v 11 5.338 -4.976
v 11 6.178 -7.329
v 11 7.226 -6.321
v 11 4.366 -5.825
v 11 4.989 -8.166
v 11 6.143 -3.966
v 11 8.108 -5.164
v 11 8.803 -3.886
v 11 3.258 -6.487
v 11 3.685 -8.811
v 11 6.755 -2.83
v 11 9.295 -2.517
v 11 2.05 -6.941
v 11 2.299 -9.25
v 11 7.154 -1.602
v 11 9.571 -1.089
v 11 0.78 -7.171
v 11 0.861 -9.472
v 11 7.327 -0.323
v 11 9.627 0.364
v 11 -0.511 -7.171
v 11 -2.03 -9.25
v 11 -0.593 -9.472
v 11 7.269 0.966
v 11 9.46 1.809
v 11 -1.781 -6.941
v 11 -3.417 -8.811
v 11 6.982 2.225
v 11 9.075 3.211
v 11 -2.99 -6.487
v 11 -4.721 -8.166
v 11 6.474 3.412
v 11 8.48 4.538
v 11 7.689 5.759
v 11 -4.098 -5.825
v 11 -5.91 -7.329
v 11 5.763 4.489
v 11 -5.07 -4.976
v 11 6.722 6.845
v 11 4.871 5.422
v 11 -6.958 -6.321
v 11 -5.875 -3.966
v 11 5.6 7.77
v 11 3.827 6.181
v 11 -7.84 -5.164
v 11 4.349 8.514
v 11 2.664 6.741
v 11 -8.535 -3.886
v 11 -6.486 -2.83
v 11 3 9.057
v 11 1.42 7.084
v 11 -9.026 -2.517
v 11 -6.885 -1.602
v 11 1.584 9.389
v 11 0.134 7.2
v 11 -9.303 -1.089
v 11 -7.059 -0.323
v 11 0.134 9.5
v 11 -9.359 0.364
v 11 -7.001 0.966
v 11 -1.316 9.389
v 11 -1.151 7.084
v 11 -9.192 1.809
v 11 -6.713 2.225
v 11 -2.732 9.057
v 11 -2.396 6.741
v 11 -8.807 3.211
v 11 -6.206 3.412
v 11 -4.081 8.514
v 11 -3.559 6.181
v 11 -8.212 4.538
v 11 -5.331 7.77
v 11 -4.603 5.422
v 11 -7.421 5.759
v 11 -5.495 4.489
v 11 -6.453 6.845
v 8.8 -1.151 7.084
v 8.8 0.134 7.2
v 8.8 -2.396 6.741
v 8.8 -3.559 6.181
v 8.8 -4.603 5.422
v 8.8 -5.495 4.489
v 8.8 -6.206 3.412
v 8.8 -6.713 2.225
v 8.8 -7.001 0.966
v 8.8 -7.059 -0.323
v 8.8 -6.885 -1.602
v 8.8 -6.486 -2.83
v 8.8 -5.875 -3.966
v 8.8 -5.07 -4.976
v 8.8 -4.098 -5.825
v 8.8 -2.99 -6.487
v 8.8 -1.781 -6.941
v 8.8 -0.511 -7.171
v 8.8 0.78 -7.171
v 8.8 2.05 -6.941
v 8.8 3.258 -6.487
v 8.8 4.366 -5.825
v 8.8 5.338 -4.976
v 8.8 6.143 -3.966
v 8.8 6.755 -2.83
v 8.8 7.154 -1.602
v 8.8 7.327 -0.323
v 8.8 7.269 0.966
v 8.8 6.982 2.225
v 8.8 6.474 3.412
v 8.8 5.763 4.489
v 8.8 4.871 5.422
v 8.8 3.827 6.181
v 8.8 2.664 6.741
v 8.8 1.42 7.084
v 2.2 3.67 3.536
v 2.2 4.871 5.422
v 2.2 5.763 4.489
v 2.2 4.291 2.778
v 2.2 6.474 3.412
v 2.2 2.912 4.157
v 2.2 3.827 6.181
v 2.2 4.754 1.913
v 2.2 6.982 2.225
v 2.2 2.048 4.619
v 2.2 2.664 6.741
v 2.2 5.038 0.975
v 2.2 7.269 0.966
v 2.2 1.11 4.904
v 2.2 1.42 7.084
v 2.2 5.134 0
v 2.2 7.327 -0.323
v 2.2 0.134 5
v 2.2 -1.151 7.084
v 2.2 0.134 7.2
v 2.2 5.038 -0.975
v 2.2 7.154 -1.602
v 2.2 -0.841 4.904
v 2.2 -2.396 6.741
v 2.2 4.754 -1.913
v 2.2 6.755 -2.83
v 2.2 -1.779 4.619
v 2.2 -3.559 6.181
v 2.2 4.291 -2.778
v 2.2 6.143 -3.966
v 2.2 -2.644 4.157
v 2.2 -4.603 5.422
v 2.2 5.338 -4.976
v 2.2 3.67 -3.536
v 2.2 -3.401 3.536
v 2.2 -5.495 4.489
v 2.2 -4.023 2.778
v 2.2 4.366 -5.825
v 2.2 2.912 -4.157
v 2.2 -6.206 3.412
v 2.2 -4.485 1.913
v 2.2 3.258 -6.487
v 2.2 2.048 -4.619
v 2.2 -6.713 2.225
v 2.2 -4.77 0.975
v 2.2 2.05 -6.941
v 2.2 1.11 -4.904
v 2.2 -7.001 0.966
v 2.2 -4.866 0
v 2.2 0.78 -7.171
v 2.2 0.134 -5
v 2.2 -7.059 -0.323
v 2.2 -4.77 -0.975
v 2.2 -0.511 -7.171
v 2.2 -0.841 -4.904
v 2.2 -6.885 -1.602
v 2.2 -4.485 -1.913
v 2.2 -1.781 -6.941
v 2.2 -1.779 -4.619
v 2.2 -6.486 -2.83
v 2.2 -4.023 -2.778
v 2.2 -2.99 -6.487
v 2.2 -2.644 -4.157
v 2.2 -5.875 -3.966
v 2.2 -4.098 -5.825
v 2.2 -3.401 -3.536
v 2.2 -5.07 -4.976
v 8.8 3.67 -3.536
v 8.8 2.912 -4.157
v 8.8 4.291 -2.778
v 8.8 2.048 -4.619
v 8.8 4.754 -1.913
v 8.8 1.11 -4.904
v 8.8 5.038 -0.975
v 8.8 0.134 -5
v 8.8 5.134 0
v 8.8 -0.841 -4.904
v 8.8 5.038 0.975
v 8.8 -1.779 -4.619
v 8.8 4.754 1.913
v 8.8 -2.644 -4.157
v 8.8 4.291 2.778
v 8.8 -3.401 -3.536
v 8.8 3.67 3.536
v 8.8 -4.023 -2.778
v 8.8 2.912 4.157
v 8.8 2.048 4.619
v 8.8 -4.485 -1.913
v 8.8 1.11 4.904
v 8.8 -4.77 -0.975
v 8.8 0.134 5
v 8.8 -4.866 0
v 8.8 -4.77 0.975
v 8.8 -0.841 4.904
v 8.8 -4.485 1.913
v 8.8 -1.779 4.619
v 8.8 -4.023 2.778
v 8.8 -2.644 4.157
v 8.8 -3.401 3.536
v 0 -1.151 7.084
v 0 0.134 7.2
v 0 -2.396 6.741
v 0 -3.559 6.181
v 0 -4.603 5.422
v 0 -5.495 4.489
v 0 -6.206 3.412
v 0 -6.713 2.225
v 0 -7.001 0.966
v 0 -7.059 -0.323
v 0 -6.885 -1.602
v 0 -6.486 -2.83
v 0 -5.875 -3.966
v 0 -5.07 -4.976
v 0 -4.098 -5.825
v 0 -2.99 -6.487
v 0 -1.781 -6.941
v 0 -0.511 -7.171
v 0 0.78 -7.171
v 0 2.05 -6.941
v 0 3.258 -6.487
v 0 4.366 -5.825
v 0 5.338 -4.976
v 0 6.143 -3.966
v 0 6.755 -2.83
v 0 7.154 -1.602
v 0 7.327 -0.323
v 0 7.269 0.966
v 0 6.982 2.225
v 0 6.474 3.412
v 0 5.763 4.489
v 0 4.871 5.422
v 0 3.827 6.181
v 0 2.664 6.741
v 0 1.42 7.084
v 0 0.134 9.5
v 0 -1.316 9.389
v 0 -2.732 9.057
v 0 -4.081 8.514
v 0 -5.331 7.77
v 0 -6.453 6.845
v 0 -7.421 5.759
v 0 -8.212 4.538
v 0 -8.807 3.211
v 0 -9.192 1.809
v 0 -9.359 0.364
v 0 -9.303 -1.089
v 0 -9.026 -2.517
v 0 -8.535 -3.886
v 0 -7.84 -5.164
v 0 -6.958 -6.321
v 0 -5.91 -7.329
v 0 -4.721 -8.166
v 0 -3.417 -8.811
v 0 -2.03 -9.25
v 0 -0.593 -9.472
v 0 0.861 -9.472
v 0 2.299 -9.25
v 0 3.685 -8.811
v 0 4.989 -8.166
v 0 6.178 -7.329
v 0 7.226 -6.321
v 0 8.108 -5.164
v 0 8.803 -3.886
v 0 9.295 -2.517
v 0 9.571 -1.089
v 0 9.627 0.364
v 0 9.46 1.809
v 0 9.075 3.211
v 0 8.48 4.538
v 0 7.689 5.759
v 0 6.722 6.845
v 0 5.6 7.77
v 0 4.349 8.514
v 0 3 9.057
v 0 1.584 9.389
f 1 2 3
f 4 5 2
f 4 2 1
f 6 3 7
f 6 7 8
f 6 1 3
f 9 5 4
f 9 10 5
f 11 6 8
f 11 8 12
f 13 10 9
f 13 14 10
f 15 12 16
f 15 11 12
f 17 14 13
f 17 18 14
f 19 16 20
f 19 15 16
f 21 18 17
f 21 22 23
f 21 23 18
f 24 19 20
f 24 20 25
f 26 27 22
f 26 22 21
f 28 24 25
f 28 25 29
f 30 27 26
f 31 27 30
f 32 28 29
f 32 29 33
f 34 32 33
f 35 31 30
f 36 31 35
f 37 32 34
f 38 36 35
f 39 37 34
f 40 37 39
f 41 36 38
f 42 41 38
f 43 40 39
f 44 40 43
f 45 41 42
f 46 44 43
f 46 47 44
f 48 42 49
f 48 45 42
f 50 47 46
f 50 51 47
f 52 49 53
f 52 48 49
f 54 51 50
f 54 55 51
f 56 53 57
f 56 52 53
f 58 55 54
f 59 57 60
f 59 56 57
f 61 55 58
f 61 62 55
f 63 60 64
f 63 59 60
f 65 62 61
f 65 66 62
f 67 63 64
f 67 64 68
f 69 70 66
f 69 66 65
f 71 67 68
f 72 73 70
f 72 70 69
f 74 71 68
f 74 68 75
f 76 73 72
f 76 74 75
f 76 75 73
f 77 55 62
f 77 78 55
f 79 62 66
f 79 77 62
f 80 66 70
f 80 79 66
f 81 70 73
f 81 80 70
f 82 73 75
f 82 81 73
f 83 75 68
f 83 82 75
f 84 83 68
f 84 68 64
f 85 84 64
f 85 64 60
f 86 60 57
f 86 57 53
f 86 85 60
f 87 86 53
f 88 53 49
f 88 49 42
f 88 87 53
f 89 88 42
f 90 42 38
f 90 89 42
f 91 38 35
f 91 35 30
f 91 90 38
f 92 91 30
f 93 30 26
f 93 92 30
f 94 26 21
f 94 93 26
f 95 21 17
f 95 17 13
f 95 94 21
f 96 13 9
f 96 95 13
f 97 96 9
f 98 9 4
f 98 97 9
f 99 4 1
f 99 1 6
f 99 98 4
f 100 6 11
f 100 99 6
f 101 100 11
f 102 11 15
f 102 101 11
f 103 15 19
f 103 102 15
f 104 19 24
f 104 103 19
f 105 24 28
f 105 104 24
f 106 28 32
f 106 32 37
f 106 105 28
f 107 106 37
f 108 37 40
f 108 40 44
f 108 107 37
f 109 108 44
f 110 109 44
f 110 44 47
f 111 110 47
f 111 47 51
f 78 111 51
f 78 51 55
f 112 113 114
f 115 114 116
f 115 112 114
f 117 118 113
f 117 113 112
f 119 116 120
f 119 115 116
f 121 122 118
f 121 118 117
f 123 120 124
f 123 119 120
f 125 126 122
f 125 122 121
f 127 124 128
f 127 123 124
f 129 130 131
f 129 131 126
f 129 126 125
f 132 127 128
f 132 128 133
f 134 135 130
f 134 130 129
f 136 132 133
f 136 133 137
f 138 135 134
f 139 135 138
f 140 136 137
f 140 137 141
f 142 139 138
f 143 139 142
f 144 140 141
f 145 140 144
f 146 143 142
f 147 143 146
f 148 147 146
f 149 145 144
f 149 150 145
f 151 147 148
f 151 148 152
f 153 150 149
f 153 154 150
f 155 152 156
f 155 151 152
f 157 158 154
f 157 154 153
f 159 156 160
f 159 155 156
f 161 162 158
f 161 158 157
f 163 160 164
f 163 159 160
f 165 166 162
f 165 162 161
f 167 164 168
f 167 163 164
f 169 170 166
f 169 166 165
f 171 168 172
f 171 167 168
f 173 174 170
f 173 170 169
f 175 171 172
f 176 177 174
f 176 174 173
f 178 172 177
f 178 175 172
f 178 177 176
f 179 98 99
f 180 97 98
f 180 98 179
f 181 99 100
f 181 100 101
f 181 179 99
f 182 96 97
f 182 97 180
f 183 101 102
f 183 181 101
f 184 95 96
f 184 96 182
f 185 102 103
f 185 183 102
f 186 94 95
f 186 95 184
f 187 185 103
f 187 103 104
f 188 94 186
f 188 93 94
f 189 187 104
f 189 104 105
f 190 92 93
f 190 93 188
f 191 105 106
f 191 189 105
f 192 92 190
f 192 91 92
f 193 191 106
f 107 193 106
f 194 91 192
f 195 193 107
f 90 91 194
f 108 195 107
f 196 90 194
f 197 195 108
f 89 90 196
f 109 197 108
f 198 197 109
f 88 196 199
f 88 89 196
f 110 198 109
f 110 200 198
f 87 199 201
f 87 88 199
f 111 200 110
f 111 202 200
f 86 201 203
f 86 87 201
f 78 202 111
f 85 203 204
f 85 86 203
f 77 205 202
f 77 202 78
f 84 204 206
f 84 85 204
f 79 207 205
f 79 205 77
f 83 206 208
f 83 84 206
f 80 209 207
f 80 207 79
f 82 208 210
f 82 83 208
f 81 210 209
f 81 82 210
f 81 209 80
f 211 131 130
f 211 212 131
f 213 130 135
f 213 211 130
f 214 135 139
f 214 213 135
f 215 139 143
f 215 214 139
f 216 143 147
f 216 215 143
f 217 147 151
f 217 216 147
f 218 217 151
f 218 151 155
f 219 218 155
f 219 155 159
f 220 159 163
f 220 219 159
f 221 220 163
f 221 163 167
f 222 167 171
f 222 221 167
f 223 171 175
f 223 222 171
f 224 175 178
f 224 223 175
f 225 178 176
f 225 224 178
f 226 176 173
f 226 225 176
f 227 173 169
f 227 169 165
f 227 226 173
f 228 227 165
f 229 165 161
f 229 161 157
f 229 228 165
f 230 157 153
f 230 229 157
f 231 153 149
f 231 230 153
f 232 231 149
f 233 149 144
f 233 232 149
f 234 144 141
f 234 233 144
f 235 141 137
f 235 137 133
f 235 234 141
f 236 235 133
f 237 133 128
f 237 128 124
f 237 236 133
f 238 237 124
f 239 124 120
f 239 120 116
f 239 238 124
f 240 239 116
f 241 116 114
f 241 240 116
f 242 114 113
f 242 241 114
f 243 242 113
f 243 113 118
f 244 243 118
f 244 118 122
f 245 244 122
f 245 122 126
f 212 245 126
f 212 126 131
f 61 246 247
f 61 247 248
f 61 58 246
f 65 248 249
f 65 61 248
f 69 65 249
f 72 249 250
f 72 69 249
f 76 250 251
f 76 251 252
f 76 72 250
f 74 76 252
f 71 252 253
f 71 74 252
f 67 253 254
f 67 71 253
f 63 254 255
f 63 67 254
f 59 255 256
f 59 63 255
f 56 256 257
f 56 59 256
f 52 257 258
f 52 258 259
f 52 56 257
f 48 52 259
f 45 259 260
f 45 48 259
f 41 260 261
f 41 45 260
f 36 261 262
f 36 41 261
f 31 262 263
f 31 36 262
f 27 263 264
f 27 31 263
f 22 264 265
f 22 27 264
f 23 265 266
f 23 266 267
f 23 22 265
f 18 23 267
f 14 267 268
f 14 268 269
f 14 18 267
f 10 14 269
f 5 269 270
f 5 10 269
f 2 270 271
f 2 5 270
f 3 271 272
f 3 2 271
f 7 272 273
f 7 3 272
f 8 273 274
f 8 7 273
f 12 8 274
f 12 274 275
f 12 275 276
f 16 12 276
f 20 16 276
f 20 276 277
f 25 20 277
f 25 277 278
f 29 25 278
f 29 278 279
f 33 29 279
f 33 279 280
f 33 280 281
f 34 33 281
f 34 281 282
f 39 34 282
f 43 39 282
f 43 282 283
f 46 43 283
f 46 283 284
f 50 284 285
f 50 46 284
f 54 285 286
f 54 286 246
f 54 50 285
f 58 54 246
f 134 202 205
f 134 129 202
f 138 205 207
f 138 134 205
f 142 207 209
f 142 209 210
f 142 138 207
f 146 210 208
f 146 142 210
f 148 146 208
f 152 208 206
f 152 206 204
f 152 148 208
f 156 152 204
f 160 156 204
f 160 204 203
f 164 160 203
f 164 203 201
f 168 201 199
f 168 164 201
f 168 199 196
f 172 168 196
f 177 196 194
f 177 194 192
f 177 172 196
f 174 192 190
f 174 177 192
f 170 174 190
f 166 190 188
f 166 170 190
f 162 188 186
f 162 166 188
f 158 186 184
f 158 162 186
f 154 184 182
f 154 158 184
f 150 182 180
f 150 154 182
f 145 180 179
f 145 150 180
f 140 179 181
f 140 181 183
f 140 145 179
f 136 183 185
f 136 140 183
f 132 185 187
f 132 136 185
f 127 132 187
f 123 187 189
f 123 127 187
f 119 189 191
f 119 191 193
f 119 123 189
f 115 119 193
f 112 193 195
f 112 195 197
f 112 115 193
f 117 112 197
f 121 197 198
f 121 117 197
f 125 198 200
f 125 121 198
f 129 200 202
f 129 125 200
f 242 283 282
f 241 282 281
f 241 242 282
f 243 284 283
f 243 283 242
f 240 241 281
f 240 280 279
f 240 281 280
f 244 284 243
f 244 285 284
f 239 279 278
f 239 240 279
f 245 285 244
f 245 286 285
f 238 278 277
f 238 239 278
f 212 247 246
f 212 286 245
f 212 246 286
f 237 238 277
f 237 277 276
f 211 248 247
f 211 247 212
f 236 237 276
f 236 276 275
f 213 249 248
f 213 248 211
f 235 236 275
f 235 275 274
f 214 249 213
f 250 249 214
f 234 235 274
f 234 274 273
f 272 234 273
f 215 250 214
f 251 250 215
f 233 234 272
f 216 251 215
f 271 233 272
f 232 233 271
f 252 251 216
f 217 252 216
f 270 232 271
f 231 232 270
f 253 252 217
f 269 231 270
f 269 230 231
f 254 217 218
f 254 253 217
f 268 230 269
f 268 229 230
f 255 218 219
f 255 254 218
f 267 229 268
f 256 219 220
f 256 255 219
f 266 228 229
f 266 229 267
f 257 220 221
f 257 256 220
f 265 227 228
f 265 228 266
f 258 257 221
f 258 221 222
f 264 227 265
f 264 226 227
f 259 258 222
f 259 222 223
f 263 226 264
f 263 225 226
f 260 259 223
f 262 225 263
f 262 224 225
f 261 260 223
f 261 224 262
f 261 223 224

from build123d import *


with BuildPart() as part:
    # Esquisse1 → Base-Révolution (revolve)
    with BuildSketch(Plane.XY, mode=Mode.PRIVATE) as base_r_volution_sk:
        Polygon((0, 7.334147334), (0, 9.634147334), (11, 9.634147334), (11, 7.334147334), (8.8, 7.334147334), (8.8, 5.134147334), (2.2, 5.134147334), (2.2, 7.334147334), align=None)
    revolve(base_r_volution_sk.sketch.rotate(Axis((-12.574722565, 0.134147334, 0), (1, 0, 0)), 90), axis=Axis((-12.574722565, 0.134147334, 0), (1, 0, 0)))


solid = part.part
